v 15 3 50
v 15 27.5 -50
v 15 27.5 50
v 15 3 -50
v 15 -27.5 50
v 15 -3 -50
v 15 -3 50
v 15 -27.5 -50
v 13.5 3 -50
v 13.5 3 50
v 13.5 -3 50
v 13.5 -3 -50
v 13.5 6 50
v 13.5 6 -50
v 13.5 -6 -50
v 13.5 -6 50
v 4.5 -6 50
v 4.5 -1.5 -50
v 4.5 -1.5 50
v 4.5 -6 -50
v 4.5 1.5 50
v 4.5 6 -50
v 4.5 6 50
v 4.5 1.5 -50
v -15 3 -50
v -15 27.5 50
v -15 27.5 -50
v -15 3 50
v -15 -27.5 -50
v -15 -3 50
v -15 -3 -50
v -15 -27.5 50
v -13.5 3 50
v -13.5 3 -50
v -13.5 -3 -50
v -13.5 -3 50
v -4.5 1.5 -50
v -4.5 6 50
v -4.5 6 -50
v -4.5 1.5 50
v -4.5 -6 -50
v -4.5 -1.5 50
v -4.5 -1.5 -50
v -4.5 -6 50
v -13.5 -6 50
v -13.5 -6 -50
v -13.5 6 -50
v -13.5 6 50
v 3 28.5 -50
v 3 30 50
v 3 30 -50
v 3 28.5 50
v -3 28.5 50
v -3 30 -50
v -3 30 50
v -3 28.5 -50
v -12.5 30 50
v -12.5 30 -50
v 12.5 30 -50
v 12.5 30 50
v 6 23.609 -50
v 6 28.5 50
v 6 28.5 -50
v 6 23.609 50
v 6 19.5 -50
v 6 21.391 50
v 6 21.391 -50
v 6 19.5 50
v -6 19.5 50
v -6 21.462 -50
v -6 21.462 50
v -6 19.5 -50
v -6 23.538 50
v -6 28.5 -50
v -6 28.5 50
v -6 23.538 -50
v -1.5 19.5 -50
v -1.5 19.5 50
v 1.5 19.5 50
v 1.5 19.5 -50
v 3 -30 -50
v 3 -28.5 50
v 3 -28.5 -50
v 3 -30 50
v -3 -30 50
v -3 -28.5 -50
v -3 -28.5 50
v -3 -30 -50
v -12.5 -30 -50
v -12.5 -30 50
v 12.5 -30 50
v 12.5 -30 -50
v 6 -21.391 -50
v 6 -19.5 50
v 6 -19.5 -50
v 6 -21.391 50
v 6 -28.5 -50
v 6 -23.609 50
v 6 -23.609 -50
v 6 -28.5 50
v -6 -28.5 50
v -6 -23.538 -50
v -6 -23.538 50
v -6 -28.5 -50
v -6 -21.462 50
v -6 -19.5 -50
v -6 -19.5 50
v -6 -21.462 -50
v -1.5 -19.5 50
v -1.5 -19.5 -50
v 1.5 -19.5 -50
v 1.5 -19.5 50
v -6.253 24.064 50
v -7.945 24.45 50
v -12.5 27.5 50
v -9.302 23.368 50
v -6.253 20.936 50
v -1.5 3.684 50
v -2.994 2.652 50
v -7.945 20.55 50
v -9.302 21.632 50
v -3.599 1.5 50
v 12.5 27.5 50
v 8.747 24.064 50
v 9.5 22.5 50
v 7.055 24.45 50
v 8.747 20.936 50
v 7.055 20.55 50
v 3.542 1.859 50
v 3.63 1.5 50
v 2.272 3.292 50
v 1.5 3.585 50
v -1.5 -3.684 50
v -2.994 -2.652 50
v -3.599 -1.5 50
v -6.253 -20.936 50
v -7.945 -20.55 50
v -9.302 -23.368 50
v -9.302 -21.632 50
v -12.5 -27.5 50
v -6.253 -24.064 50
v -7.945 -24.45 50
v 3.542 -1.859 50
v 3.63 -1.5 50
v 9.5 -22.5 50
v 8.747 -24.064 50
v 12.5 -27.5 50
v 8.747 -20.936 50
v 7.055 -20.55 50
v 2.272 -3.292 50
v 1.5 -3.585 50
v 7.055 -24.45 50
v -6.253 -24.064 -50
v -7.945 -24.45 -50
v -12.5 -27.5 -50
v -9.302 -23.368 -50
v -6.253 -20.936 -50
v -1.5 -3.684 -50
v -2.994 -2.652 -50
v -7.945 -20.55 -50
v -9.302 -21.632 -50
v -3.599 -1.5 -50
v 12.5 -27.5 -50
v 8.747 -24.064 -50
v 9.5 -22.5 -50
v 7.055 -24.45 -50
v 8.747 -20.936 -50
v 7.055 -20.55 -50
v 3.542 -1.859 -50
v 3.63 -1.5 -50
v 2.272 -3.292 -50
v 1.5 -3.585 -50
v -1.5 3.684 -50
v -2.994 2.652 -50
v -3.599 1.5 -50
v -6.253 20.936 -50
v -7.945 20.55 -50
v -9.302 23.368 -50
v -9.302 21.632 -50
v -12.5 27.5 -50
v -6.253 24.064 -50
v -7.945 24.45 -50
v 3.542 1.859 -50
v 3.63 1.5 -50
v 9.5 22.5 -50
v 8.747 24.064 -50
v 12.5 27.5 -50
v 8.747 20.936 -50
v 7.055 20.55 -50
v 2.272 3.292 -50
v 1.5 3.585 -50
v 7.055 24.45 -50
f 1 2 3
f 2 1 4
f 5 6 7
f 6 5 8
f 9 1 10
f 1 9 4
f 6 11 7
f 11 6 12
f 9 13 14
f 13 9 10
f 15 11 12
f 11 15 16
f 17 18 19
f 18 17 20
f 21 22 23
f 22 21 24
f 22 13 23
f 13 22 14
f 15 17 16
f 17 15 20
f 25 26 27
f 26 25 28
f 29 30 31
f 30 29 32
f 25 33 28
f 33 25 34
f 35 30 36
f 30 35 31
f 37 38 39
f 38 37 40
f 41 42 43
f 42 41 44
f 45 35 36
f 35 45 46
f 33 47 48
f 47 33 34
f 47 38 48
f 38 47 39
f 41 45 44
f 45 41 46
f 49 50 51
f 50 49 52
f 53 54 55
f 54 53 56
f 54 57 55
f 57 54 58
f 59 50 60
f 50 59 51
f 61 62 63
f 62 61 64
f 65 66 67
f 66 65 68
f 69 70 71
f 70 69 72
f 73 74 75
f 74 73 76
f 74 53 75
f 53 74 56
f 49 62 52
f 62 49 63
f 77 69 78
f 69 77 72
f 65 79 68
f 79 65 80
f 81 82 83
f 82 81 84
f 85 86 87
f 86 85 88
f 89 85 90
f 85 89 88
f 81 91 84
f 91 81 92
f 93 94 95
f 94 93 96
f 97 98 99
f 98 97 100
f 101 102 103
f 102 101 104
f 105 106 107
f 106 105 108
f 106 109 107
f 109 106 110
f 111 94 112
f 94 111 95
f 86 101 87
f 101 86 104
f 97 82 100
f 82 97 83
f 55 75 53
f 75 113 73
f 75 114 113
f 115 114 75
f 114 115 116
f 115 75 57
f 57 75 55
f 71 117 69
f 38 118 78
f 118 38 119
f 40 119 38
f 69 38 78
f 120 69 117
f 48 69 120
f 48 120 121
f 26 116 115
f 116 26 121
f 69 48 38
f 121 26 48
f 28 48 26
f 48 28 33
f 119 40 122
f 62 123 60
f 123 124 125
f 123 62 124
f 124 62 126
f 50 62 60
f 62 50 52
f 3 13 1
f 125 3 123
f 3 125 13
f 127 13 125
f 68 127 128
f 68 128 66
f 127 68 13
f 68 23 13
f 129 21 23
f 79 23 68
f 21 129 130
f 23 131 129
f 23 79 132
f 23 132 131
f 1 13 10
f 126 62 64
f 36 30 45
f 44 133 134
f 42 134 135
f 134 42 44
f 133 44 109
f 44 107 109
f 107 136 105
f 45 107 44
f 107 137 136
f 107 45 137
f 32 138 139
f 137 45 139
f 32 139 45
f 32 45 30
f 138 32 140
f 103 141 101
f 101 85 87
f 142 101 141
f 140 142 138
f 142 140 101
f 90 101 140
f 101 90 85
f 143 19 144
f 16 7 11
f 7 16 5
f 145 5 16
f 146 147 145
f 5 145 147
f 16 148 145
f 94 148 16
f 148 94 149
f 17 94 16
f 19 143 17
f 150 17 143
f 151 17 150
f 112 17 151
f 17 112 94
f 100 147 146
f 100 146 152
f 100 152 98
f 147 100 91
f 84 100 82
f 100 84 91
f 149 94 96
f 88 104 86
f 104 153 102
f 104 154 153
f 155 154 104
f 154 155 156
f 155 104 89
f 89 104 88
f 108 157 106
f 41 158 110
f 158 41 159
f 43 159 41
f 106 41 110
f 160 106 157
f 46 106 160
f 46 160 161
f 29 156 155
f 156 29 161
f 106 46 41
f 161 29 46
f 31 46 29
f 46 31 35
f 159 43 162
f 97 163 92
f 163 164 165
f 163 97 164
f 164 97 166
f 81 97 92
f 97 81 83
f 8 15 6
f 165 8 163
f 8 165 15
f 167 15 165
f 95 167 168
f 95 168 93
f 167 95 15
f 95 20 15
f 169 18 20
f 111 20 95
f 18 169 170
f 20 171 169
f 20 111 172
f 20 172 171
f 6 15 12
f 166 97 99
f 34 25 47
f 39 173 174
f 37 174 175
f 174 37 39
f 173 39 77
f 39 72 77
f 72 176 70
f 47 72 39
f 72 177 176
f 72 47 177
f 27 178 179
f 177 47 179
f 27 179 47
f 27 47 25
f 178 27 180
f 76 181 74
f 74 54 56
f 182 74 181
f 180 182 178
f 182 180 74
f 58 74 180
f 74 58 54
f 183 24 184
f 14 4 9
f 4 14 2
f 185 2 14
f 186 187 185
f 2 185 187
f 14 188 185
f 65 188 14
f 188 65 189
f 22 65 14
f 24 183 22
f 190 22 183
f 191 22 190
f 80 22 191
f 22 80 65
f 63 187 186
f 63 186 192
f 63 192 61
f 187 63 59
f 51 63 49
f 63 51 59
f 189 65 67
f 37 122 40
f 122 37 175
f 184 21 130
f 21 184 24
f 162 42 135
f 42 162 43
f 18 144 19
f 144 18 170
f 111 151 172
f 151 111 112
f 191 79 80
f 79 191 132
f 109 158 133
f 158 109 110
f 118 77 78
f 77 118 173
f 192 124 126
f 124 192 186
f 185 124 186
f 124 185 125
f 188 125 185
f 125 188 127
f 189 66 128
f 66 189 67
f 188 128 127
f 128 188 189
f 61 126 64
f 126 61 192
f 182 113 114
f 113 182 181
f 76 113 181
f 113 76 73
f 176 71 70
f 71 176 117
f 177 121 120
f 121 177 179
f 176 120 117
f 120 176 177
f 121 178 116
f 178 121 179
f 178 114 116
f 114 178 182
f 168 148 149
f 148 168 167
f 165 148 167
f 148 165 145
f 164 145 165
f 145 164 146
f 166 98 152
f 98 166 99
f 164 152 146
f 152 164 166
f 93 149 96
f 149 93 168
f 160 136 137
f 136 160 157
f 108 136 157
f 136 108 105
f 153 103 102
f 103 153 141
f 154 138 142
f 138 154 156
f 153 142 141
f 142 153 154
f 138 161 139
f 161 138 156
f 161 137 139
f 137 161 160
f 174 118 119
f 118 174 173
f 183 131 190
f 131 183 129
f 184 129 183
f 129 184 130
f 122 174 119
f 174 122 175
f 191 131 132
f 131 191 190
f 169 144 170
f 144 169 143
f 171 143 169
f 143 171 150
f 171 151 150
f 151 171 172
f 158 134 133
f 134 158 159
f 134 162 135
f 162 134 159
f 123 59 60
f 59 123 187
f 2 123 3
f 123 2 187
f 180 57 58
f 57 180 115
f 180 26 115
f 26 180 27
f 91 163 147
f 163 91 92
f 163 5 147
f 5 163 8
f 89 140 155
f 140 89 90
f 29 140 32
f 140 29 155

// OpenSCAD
// Parameters
cross_section_width_mm = 30; //[15:60:1]
cross_section_height_mm = 60; //[30:120:1]
length_mm = 100; //[50:200:1]
center = 1; //[0:1:1]
cornerHole = 1; //[0:1:1]
overlap_mm = 1; //[0.5:2:0.1]
wall_thickness_mm = 2.5; //[1.5:5:0.1]
slot_opening_width_mm = 6; //[4:10:0.1]
slot_cavity_width_mm = 12; //[8:18:0.1]
slot_depth_mm = 8; //[5:14:0.1]
slot_opening_depth_mm = 2.5; //[1.5:5:0.1]
center_bore_diameter_mm = 8; //[4:16:0.1]
web_thickness_mm = 3; //[2:6:0.1]
corner_hole_diameter_mm = 4; //[0:8:0.1]
corner_hole_offset_from_edges_mm = 7.5; //[4:15:0.1]

// E3060 - Detailed geometry for T-slot extrusion
module extrusion() {
  color("Silver") {
    difference() {
      // Outer body
      cube([cross_section_width_mm, cross_section_height_mm, length_mm], center=true);
      
      // T-slot channels
      union() {
        // Right T-slot
        translate([cross_section_width_mm/2 - (slot_opening_depth_mm + overlap_mm)/2, 0, 0])
          cube([slot_opening_depth_mm + overlap_mm, slot_opening_width_mm, length_mm + 2*overlap_mm], center=true);
        translate([cross_section_width_mm/2 - slot_opening_depth_mm - (slot_depth_mm + overlap_mm)/2 + overlap_mm, 0, 0])
          cube([slot_depth_mm + overlap_mm, slot_cavity_width_mm, length_mm + 2*overlap_mm], center=true);
        
        // Left T-slot
        translate([-cross_section_width_mm/2 + (slot_opening_depth_mm + overlap_mm)/2, 0, 0])
          cube([slot_opening_depth_mm + overlap_mm, slot_opening_width_mm, length_mm + 2*overlap_mm], center=true);
        translate([-cross_section_width_mm/2 + slot_opening_depth_mm + (slot_depth_mm + overlap_mm)/2 - overlap_mm, 0, 0])
          cube([slot_depth_mm + overlap_mm, slot_cavity_width_mm, length_mm + 2*overlap_mm], center=true);
        
        // Top T-slot
        translate([0, cross_section_height_mm/2 - (slot_opening_depth_mm + overlap_mm)/2, 0])
          cube([slot_opening_width_mm, slot_opening_depth_mm + overlap_mm, length_mm + 2*overlap_mm], center=true);
        translate([0, cross_section_height_mm/2 - slot_opening_depth_mm - (slot_depth_mm + overlap_mm)/2 + overlap_mm, 0])
          cube([slot_cavity_width_mm, slot_depth_mm + overlap_mm, length_mm + 2*overlap_mm], center=true);
        
        // Bottom T-slot
        translate([0, -cross_section_height_mm/2 + (slot_opening_depth_mm + overlap_mm)/2, 0])
          cube([slot_opening_width_mm, slot_opening_depth_mm + overlap_mm, length_mm + 2*overlap_mm], center=true);
        translate([0, -cross_section_height_mm/2 + slot_opening_depth_mm + (slot_depth_mm + overlap_mm)/2 - overlap_mm, 0])
          cube([slot_cavity_width_mm, slot_depth_mm + overlap_mm, length_mm + 2*overlap_mm], center=true);
      }
      
      // Center bore
      translate([0, 0, 0])
        cylinder(r=center_bore_diameter_mm/2, h=length_mm + 2*overlap_mm, center=true);
      
      // Internal webbing
      union() {
        translate([0, 0, 0])
          cube([cross_section_width_mm - 2*wall_thickness_mm, web_thickness_mm, length_mm], center=true);
        translate([0, 0, 0])
          cube([web_thickness_mm, cross_section_height_mm - 2*wall_thickness_mm, length_mm], center=true);
      }
      
      // Corner holes
      if (cornerHole) {
        union() {
          translate([cross_section_width_mm/2 - corner_hole_offset_from_edges_mm, cross_section_height_mm/2 - corner_hole_offset_from_edges_mm, 0])
            cylinder(r=corner_hole_diameter_mm/2, h=length_mm + 2*overlap_mm, center=true);
          translate([-cross_section_width_mm/2 + corner_hole_offset_from_edges_mm, cross_section_height_mm/2 - corner_hole_offset_from_edges_mm, 0])
            cylinder(r=corner_hole_diameter_mm/2, h=length_mm + 2*overlap_mm, center=true);
          translate([cross_section_width_mm/2 - corner_hole_offset_from_edges_mm, -cross_section_height_mm/2 + corner_hole_offset_from_edges_mm, 0])
            cylinder(r=corner_hole_diameter_mm/2, h=length_mm + 2*overlap_mm, center=true);
          translate([-cross_section_width_mm/2 + corner_hole_offset_from_edges_mm, -cross_section_height_mm/2 + corner_hole_offset_from_edges_mm, 0])
            cylinder(r=corner_hole_diameter_mm/2, h=length_mm + 2*overlap_mm, center=true);
        }
      }
    }
  }
}

// Box Corner Profile Section - Detailed geometry
module box_corner_profile_section() {
  color("DimGray") {
    cube([wall_thickness_mm, wall_thickness_mm, length_mm], center=true);
  }
}

// Box Corner Profile Sections - Detailed geometry
module box_corner_profile_sections() {
  union() {
    translate([cross_section_width_mm/2 - wall_thickness_mm/2, cross_section_height_mm/2 - wall_thickness_mm/2, 0])
      box_corner_profile_section();
    translate([-cross_section_width_mm/2 + wall_thickness_mm/2, cross_section_height_mm/2 - wall_thickness_mm/2, 0])
      box_corner_profile_section();
    translate([cross_section_width_mm/2 - wall_thickness_mm/2, -cross_section_height_mm/2 + wall_thickness_mm/2, 0])
      box_corner_profile_section();
    translate([-cross_section_width_mm/2 + wall_thickness_mm/2, -cross_section_height_mm/2 + wall_thickness_mm/2, 0])
      box_corner_profile_section();
  }
}

// Extrusion Cross Section - Detailed geometry
module extrusion_cross_section() {
  difference() {
    extrusion();
    box_corner_profile_sections();
  }
}

// Assembly - Combine all parts
module assembly() {
  extrusion_cross_section();
}

assembly();
